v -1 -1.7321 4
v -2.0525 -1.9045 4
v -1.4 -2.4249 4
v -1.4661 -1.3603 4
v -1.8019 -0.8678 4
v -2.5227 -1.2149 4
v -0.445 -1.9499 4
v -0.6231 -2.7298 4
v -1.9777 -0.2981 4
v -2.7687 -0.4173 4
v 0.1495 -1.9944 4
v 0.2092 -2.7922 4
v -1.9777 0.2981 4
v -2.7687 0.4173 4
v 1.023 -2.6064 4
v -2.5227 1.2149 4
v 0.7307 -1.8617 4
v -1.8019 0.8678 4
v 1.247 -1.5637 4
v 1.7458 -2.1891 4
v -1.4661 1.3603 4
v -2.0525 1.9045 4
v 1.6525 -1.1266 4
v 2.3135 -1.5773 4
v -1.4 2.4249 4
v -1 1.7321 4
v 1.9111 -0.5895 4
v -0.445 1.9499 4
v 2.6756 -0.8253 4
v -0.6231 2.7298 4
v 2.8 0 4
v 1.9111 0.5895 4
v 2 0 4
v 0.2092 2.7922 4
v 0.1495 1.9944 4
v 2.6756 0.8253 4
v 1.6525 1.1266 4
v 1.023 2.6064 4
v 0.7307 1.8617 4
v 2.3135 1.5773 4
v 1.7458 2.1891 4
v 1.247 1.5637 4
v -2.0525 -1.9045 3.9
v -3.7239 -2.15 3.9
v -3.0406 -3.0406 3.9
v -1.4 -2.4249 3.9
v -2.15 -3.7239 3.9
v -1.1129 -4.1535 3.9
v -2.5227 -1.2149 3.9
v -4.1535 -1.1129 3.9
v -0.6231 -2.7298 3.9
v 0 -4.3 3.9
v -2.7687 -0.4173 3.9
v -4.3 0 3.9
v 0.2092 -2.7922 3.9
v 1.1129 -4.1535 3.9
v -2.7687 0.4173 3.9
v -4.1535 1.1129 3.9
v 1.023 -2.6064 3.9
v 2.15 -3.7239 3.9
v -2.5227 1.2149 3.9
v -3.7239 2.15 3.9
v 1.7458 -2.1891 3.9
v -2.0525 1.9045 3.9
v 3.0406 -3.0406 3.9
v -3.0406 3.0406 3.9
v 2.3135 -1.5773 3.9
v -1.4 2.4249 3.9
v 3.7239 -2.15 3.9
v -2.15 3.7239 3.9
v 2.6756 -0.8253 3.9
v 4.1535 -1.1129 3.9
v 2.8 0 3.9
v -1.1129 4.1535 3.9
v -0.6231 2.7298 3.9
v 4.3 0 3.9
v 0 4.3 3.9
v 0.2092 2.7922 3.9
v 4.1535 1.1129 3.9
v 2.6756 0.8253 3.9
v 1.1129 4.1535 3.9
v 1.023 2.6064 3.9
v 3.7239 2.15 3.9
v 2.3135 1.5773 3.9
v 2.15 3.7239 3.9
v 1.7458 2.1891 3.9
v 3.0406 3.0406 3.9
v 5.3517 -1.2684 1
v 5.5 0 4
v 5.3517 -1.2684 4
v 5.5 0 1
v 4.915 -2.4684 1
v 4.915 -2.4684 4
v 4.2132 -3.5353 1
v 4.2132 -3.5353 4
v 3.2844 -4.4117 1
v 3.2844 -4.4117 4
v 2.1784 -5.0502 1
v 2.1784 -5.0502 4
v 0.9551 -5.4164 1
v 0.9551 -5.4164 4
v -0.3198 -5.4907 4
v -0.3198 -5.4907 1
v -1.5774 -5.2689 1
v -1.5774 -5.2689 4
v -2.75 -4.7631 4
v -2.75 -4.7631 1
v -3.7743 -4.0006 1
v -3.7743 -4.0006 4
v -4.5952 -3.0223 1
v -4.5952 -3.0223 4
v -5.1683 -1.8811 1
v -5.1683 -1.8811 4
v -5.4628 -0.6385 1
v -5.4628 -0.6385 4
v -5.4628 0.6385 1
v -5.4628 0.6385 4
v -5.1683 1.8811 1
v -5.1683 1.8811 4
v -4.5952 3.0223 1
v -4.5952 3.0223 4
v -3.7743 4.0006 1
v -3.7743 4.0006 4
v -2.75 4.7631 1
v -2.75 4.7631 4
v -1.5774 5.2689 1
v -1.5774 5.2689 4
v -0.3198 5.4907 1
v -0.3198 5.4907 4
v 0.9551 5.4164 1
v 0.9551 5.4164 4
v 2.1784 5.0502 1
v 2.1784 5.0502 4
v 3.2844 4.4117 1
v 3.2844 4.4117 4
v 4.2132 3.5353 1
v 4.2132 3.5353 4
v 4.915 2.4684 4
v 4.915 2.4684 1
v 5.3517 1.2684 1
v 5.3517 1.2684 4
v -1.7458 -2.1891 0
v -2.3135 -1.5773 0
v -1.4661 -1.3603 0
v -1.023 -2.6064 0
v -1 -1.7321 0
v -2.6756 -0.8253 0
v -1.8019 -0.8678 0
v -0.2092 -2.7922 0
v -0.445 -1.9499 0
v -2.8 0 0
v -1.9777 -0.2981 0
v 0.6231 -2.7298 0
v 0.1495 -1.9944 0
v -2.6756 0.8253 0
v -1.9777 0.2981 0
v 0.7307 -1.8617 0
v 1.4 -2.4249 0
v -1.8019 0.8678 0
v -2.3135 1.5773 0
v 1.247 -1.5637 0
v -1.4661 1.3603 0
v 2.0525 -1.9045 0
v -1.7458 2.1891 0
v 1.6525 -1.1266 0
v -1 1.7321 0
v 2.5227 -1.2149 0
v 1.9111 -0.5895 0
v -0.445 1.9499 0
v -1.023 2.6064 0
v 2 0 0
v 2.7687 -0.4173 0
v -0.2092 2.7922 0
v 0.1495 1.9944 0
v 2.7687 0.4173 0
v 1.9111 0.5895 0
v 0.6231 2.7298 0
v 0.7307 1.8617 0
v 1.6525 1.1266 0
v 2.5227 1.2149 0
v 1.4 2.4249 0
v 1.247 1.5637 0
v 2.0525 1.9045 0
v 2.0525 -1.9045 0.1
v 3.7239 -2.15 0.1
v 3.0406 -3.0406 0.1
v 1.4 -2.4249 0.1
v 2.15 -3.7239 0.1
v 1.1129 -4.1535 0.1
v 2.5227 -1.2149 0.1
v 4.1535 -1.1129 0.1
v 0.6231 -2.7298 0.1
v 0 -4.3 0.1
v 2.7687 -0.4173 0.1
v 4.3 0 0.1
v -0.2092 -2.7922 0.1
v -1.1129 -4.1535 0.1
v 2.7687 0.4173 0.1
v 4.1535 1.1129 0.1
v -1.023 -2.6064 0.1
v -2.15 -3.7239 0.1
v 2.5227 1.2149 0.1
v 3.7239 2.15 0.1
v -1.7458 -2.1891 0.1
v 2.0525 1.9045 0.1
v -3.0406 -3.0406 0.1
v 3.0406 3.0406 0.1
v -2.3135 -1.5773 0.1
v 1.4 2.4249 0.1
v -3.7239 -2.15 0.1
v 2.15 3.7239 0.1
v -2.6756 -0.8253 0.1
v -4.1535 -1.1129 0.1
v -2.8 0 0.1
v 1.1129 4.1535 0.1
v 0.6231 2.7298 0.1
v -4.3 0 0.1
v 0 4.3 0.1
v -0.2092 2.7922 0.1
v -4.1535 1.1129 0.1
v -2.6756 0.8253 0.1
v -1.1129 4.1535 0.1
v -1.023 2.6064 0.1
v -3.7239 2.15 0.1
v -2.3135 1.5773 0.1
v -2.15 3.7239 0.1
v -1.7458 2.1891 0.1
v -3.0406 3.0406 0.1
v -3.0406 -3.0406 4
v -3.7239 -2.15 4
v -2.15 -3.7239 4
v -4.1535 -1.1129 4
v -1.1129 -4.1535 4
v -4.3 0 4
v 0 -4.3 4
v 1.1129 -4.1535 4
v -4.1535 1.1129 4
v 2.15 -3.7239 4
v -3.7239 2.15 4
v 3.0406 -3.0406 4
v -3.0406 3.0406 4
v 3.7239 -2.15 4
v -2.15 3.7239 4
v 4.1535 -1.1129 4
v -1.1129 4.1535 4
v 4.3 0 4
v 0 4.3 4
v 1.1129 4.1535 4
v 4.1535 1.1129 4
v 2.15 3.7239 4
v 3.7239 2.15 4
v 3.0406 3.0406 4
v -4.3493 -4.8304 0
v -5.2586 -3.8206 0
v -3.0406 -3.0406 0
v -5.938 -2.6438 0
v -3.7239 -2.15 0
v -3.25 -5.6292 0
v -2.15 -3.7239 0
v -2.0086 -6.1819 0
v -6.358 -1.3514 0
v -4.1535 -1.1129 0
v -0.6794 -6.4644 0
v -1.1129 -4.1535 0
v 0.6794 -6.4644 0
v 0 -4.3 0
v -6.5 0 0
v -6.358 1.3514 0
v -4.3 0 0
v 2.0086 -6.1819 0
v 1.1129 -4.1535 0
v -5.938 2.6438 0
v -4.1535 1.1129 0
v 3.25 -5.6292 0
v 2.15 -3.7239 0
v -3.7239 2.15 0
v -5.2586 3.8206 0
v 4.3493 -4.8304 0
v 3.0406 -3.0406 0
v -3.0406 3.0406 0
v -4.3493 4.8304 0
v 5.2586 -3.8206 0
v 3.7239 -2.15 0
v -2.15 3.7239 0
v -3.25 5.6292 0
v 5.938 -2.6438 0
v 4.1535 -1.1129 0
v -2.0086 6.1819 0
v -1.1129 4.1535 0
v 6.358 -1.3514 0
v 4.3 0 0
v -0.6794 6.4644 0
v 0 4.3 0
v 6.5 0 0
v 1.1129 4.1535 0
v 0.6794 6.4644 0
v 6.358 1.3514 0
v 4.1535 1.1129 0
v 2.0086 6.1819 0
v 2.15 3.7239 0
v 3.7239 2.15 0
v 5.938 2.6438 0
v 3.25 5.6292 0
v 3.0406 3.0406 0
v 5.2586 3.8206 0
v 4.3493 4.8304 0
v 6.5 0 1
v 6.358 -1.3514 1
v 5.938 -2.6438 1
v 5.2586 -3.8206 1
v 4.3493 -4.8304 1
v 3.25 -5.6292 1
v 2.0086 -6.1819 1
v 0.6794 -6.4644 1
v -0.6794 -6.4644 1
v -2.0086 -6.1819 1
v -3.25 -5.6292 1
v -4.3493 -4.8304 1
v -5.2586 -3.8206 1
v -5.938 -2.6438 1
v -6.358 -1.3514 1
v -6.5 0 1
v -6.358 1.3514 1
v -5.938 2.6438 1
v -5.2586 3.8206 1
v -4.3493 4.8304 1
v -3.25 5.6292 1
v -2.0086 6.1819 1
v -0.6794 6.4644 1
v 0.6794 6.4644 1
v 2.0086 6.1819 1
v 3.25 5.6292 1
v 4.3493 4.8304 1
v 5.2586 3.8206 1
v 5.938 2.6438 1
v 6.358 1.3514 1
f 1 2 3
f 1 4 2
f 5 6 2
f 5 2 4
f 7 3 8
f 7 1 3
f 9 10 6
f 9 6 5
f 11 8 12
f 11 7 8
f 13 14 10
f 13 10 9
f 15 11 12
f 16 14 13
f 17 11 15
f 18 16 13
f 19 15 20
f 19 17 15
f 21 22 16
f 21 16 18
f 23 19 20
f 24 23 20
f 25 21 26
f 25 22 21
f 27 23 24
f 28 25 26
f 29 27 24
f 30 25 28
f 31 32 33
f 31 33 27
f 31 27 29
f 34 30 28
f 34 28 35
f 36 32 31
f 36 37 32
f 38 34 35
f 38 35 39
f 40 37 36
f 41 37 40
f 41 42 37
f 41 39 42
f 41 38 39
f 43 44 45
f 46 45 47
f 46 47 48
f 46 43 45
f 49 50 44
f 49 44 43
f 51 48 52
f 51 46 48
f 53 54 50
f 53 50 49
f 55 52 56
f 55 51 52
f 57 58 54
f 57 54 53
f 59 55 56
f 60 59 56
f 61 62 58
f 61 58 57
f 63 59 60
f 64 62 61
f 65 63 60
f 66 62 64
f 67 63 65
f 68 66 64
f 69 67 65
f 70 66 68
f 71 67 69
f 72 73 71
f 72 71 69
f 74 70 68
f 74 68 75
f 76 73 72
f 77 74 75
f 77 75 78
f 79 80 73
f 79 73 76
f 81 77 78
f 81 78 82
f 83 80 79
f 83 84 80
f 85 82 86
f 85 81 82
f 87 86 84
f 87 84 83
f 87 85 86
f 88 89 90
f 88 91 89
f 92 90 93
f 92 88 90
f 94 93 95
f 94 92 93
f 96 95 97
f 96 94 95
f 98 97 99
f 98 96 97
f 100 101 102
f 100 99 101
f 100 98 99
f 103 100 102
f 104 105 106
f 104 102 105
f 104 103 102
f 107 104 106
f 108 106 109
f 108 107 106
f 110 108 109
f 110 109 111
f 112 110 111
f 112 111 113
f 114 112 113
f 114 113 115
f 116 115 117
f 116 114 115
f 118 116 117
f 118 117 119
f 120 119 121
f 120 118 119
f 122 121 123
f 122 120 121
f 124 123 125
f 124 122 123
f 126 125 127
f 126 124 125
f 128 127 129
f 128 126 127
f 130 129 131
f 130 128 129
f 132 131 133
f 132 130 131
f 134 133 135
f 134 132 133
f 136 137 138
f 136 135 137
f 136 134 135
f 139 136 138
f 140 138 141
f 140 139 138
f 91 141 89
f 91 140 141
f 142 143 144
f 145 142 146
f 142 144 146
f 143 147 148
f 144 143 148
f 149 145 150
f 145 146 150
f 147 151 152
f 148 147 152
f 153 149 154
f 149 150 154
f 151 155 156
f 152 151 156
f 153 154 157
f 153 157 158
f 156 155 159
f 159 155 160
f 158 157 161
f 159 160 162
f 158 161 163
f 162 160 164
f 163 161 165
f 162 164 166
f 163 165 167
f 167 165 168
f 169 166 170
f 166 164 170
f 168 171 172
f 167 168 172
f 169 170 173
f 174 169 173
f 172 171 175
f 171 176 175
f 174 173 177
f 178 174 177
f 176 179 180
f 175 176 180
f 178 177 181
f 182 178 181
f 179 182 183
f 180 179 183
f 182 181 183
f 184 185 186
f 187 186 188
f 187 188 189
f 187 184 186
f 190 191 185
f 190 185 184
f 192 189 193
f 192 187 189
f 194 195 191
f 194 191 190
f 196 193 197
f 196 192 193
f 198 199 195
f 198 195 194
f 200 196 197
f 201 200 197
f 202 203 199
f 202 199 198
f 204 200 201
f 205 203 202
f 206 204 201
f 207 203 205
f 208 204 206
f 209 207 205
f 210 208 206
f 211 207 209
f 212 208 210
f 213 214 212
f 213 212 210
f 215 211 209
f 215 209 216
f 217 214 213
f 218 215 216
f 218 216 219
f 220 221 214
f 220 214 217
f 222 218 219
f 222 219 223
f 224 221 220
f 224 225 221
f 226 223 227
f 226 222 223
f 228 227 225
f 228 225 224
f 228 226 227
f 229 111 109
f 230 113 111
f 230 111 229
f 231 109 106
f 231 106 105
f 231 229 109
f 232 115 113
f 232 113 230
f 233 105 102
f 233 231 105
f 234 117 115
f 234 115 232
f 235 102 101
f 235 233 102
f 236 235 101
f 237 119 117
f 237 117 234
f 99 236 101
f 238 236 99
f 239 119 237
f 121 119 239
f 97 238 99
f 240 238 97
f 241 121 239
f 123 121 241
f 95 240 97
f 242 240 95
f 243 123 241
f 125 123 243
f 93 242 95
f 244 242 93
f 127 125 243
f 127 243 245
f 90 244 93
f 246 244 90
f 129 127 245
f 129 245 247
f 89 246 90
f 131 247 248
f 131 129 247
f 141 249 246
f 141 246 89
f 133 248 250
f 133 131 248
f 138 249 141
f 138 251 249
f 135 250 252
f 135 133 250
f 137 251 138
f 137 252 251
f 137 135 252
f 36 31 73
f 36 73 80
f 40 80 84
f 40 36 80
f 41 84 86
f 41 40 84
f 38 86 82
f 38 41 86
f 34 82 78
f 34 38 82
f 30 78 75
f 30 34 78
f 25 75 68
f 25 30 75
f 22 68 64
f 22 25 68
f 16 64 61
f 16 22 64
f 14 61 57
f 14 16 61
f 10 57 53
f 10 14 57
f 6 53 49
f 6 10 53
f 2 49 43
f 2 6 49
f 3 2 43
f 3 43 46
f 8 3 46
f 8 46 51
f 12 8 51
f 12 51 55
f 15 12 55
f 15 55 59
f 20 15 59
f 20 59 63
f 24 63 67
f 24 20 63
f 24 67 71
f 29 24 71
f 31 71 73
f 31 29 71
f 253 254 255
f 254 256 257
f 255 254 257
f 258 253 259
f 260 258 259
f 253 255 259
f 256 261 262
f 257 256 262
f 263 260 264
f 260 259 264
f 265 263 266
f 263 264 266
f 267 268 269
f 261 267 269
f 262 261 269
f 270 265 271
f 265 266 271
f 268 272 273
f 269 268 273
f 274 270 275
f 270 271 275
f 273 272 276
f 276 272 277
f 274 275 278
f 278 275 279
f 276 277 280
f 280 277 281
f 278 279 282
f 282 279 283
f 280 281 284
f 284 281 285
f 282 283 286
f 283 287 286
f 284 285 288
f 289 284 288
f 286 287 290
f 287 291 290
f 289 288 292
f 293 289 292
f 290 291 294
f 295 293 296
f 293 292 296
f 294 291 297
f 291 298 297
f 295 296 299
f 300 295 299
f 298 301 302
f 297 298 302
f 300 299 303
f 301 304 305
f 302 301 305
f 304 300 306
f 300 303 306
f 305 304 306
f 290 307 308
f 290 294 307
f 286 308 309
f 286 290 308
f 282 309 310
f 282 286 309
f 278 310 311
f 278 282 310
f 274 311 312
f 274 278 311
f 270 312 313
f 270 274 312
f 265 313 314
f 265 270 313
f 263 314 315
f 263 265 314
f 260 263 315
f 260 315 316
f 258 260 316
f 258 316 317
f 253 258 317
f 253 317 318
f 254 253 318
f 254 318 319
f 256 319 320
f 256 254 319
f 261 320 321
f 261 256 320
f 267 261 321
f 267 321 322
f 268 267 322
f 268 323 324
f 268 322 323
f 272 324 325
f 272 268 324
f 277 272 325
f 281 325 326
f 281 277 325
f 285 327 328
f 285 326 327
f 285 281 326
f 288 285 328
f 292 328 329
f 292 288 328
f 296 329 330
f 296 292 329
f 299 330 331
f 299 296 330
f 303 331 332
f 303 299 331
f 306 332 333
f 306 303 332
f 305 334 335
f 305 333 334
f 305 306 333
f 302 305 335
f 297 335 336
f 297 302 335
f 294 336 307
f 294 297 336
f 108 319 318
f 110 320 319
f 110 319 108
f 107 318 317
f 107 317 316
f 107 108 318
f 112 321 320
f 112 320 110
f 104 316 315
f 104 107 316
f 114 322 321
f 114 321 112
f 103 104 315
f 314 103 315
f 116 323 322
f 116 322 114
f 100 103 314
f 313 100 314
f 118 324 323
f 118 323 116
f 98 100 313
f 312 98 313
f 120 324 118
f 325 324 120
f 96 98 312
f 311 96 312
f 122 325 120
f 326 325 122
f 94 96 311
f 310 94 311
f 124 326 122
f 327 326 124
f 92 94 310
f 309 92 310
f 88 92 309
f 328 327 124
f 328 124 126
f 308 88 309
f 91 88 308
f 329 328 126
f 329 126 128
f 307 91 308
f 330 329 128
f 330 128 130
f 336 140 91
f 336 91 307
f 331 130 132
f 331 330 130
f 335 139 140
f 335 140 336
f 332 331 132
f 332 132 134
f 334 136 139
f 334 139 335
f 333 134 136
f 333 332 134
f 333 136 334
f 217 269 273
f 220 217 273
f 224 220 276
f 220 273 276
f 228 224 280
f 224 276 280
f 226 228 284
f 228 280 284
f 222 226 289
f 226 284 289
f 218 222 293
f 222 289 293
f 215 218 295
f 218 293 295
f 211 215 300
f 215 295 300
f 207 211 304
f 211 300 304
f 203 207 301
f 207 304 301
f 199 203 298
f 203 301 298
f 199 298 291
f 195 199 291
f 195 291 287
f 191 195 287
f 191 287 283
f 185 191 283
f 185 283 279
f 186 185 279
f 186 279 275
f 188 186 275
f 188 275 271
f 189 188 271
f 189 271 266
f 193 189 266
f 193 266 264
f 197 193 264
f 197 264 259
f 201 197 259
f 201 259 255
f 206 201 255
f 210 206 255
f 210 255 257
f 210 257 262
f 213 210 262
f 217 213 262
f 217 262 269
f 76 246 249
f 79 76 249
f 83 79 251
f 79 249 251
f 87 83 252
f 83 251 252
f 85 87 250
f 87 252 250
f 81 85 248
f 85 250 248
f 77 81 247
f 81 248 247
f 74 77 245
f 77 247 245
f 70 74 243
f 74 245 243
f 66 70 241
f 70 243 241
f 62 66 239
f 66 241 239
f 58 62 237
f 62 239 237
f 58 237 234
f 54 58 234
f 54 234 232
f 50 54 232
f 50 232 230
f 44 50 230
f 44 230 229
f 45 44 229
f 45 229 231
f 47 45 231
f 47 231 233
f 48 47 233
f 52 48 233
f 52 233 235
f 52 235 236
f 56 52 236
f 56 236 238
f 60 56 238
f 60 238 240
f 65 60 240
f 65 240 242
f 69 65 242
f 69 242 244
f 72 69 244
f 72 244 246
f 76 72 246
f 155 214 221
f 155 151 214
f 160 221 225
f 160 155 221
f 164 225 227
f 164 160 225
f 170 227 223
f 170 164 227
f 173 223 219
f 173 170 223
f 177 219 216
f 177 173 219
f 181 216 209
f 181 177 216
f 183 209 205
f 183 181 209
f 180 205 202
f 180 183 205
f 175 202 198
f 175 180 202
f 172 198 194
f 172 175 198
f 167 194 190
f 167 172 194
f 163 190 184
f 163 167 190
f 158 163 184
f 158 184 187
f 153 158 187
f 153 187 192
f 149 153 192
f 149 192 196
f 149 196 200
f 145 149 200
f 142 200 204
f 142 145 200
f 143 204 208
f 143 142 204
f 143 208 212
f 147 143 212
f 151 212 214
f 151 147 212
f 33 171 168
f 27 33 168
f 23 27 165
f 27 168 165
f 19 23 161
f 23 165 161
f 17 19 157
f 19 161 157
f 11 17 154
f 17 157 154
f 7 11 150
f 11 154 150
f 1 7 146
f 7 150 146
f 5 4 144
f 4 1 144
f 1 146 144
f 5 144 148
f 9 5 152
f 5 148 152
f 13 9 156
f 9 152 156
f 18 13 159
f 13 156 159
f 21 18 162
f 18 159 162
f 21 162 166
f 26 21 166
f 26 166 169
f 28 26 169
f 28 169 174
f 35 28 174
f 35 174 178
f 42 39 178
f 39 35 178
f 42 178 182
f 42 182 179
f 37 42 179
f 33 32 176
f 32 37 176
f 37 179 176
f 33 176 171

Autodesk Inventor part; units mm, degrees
ref_plane "YZ Plane" through (0, 0, 0) normal (1, 0, 0) x (0, 1, 0)
ref_plane "XZ Plane" through (0, 0, 0) normal (0, 1, 0) x (-1, 0, 0)
ref_plane "XY Plane" through (0, 0, 0) normal (0, 0, 1) x (1, 0, 0)
sketch "スケッチ1" plane through (0, 0, 0) normal (0, 0, 1) x (1, 0, 0)
  circle A0 centre (0, 0) radius 2
  circle A1 centre (0, 0) radius 5.5
  circle A2 centre (0, 0) radius 6.5
  dimension "d0" = 4
  dimension "d1" = 11
  dimension "d2" = 1
extrude "押し出し1" add sketch "スケッチ1" along normal blind 4 contours A1
extrude "押し出し2" add sketch "スケッチ1" along normal blind 1 contours A2
sketch "スケッチ2" plane through (0, 0, 0) normal (0, 0, -1) x (-1, 0, 0)
  circle A0 centre (0, 0) radius 2.8
  circle A1 centre (0, 0) radius 4.3
  dimension "d7" = 5.6
  dimension "d8" = 8.6
extrude "押し出し3" cut sketch "スケッチ2" against normal blind 0.1
sketch "スケッチ3" plane through (0, 0, 4) normal (0, 0, 1) x (1, 0, 0)
  circle A0 centre (0, 0) radius 2.8
  circle A1 centre (0, 0) radius 4.3
  dimension "d11" = 5.6
  dimension "d12" = 8.6
extrude "押し出し4" cut sketch "スケッチ3" against normal blind 0.1
properties part number "ベアリングFd4D11B4" material "鋼、炭素鋼"
